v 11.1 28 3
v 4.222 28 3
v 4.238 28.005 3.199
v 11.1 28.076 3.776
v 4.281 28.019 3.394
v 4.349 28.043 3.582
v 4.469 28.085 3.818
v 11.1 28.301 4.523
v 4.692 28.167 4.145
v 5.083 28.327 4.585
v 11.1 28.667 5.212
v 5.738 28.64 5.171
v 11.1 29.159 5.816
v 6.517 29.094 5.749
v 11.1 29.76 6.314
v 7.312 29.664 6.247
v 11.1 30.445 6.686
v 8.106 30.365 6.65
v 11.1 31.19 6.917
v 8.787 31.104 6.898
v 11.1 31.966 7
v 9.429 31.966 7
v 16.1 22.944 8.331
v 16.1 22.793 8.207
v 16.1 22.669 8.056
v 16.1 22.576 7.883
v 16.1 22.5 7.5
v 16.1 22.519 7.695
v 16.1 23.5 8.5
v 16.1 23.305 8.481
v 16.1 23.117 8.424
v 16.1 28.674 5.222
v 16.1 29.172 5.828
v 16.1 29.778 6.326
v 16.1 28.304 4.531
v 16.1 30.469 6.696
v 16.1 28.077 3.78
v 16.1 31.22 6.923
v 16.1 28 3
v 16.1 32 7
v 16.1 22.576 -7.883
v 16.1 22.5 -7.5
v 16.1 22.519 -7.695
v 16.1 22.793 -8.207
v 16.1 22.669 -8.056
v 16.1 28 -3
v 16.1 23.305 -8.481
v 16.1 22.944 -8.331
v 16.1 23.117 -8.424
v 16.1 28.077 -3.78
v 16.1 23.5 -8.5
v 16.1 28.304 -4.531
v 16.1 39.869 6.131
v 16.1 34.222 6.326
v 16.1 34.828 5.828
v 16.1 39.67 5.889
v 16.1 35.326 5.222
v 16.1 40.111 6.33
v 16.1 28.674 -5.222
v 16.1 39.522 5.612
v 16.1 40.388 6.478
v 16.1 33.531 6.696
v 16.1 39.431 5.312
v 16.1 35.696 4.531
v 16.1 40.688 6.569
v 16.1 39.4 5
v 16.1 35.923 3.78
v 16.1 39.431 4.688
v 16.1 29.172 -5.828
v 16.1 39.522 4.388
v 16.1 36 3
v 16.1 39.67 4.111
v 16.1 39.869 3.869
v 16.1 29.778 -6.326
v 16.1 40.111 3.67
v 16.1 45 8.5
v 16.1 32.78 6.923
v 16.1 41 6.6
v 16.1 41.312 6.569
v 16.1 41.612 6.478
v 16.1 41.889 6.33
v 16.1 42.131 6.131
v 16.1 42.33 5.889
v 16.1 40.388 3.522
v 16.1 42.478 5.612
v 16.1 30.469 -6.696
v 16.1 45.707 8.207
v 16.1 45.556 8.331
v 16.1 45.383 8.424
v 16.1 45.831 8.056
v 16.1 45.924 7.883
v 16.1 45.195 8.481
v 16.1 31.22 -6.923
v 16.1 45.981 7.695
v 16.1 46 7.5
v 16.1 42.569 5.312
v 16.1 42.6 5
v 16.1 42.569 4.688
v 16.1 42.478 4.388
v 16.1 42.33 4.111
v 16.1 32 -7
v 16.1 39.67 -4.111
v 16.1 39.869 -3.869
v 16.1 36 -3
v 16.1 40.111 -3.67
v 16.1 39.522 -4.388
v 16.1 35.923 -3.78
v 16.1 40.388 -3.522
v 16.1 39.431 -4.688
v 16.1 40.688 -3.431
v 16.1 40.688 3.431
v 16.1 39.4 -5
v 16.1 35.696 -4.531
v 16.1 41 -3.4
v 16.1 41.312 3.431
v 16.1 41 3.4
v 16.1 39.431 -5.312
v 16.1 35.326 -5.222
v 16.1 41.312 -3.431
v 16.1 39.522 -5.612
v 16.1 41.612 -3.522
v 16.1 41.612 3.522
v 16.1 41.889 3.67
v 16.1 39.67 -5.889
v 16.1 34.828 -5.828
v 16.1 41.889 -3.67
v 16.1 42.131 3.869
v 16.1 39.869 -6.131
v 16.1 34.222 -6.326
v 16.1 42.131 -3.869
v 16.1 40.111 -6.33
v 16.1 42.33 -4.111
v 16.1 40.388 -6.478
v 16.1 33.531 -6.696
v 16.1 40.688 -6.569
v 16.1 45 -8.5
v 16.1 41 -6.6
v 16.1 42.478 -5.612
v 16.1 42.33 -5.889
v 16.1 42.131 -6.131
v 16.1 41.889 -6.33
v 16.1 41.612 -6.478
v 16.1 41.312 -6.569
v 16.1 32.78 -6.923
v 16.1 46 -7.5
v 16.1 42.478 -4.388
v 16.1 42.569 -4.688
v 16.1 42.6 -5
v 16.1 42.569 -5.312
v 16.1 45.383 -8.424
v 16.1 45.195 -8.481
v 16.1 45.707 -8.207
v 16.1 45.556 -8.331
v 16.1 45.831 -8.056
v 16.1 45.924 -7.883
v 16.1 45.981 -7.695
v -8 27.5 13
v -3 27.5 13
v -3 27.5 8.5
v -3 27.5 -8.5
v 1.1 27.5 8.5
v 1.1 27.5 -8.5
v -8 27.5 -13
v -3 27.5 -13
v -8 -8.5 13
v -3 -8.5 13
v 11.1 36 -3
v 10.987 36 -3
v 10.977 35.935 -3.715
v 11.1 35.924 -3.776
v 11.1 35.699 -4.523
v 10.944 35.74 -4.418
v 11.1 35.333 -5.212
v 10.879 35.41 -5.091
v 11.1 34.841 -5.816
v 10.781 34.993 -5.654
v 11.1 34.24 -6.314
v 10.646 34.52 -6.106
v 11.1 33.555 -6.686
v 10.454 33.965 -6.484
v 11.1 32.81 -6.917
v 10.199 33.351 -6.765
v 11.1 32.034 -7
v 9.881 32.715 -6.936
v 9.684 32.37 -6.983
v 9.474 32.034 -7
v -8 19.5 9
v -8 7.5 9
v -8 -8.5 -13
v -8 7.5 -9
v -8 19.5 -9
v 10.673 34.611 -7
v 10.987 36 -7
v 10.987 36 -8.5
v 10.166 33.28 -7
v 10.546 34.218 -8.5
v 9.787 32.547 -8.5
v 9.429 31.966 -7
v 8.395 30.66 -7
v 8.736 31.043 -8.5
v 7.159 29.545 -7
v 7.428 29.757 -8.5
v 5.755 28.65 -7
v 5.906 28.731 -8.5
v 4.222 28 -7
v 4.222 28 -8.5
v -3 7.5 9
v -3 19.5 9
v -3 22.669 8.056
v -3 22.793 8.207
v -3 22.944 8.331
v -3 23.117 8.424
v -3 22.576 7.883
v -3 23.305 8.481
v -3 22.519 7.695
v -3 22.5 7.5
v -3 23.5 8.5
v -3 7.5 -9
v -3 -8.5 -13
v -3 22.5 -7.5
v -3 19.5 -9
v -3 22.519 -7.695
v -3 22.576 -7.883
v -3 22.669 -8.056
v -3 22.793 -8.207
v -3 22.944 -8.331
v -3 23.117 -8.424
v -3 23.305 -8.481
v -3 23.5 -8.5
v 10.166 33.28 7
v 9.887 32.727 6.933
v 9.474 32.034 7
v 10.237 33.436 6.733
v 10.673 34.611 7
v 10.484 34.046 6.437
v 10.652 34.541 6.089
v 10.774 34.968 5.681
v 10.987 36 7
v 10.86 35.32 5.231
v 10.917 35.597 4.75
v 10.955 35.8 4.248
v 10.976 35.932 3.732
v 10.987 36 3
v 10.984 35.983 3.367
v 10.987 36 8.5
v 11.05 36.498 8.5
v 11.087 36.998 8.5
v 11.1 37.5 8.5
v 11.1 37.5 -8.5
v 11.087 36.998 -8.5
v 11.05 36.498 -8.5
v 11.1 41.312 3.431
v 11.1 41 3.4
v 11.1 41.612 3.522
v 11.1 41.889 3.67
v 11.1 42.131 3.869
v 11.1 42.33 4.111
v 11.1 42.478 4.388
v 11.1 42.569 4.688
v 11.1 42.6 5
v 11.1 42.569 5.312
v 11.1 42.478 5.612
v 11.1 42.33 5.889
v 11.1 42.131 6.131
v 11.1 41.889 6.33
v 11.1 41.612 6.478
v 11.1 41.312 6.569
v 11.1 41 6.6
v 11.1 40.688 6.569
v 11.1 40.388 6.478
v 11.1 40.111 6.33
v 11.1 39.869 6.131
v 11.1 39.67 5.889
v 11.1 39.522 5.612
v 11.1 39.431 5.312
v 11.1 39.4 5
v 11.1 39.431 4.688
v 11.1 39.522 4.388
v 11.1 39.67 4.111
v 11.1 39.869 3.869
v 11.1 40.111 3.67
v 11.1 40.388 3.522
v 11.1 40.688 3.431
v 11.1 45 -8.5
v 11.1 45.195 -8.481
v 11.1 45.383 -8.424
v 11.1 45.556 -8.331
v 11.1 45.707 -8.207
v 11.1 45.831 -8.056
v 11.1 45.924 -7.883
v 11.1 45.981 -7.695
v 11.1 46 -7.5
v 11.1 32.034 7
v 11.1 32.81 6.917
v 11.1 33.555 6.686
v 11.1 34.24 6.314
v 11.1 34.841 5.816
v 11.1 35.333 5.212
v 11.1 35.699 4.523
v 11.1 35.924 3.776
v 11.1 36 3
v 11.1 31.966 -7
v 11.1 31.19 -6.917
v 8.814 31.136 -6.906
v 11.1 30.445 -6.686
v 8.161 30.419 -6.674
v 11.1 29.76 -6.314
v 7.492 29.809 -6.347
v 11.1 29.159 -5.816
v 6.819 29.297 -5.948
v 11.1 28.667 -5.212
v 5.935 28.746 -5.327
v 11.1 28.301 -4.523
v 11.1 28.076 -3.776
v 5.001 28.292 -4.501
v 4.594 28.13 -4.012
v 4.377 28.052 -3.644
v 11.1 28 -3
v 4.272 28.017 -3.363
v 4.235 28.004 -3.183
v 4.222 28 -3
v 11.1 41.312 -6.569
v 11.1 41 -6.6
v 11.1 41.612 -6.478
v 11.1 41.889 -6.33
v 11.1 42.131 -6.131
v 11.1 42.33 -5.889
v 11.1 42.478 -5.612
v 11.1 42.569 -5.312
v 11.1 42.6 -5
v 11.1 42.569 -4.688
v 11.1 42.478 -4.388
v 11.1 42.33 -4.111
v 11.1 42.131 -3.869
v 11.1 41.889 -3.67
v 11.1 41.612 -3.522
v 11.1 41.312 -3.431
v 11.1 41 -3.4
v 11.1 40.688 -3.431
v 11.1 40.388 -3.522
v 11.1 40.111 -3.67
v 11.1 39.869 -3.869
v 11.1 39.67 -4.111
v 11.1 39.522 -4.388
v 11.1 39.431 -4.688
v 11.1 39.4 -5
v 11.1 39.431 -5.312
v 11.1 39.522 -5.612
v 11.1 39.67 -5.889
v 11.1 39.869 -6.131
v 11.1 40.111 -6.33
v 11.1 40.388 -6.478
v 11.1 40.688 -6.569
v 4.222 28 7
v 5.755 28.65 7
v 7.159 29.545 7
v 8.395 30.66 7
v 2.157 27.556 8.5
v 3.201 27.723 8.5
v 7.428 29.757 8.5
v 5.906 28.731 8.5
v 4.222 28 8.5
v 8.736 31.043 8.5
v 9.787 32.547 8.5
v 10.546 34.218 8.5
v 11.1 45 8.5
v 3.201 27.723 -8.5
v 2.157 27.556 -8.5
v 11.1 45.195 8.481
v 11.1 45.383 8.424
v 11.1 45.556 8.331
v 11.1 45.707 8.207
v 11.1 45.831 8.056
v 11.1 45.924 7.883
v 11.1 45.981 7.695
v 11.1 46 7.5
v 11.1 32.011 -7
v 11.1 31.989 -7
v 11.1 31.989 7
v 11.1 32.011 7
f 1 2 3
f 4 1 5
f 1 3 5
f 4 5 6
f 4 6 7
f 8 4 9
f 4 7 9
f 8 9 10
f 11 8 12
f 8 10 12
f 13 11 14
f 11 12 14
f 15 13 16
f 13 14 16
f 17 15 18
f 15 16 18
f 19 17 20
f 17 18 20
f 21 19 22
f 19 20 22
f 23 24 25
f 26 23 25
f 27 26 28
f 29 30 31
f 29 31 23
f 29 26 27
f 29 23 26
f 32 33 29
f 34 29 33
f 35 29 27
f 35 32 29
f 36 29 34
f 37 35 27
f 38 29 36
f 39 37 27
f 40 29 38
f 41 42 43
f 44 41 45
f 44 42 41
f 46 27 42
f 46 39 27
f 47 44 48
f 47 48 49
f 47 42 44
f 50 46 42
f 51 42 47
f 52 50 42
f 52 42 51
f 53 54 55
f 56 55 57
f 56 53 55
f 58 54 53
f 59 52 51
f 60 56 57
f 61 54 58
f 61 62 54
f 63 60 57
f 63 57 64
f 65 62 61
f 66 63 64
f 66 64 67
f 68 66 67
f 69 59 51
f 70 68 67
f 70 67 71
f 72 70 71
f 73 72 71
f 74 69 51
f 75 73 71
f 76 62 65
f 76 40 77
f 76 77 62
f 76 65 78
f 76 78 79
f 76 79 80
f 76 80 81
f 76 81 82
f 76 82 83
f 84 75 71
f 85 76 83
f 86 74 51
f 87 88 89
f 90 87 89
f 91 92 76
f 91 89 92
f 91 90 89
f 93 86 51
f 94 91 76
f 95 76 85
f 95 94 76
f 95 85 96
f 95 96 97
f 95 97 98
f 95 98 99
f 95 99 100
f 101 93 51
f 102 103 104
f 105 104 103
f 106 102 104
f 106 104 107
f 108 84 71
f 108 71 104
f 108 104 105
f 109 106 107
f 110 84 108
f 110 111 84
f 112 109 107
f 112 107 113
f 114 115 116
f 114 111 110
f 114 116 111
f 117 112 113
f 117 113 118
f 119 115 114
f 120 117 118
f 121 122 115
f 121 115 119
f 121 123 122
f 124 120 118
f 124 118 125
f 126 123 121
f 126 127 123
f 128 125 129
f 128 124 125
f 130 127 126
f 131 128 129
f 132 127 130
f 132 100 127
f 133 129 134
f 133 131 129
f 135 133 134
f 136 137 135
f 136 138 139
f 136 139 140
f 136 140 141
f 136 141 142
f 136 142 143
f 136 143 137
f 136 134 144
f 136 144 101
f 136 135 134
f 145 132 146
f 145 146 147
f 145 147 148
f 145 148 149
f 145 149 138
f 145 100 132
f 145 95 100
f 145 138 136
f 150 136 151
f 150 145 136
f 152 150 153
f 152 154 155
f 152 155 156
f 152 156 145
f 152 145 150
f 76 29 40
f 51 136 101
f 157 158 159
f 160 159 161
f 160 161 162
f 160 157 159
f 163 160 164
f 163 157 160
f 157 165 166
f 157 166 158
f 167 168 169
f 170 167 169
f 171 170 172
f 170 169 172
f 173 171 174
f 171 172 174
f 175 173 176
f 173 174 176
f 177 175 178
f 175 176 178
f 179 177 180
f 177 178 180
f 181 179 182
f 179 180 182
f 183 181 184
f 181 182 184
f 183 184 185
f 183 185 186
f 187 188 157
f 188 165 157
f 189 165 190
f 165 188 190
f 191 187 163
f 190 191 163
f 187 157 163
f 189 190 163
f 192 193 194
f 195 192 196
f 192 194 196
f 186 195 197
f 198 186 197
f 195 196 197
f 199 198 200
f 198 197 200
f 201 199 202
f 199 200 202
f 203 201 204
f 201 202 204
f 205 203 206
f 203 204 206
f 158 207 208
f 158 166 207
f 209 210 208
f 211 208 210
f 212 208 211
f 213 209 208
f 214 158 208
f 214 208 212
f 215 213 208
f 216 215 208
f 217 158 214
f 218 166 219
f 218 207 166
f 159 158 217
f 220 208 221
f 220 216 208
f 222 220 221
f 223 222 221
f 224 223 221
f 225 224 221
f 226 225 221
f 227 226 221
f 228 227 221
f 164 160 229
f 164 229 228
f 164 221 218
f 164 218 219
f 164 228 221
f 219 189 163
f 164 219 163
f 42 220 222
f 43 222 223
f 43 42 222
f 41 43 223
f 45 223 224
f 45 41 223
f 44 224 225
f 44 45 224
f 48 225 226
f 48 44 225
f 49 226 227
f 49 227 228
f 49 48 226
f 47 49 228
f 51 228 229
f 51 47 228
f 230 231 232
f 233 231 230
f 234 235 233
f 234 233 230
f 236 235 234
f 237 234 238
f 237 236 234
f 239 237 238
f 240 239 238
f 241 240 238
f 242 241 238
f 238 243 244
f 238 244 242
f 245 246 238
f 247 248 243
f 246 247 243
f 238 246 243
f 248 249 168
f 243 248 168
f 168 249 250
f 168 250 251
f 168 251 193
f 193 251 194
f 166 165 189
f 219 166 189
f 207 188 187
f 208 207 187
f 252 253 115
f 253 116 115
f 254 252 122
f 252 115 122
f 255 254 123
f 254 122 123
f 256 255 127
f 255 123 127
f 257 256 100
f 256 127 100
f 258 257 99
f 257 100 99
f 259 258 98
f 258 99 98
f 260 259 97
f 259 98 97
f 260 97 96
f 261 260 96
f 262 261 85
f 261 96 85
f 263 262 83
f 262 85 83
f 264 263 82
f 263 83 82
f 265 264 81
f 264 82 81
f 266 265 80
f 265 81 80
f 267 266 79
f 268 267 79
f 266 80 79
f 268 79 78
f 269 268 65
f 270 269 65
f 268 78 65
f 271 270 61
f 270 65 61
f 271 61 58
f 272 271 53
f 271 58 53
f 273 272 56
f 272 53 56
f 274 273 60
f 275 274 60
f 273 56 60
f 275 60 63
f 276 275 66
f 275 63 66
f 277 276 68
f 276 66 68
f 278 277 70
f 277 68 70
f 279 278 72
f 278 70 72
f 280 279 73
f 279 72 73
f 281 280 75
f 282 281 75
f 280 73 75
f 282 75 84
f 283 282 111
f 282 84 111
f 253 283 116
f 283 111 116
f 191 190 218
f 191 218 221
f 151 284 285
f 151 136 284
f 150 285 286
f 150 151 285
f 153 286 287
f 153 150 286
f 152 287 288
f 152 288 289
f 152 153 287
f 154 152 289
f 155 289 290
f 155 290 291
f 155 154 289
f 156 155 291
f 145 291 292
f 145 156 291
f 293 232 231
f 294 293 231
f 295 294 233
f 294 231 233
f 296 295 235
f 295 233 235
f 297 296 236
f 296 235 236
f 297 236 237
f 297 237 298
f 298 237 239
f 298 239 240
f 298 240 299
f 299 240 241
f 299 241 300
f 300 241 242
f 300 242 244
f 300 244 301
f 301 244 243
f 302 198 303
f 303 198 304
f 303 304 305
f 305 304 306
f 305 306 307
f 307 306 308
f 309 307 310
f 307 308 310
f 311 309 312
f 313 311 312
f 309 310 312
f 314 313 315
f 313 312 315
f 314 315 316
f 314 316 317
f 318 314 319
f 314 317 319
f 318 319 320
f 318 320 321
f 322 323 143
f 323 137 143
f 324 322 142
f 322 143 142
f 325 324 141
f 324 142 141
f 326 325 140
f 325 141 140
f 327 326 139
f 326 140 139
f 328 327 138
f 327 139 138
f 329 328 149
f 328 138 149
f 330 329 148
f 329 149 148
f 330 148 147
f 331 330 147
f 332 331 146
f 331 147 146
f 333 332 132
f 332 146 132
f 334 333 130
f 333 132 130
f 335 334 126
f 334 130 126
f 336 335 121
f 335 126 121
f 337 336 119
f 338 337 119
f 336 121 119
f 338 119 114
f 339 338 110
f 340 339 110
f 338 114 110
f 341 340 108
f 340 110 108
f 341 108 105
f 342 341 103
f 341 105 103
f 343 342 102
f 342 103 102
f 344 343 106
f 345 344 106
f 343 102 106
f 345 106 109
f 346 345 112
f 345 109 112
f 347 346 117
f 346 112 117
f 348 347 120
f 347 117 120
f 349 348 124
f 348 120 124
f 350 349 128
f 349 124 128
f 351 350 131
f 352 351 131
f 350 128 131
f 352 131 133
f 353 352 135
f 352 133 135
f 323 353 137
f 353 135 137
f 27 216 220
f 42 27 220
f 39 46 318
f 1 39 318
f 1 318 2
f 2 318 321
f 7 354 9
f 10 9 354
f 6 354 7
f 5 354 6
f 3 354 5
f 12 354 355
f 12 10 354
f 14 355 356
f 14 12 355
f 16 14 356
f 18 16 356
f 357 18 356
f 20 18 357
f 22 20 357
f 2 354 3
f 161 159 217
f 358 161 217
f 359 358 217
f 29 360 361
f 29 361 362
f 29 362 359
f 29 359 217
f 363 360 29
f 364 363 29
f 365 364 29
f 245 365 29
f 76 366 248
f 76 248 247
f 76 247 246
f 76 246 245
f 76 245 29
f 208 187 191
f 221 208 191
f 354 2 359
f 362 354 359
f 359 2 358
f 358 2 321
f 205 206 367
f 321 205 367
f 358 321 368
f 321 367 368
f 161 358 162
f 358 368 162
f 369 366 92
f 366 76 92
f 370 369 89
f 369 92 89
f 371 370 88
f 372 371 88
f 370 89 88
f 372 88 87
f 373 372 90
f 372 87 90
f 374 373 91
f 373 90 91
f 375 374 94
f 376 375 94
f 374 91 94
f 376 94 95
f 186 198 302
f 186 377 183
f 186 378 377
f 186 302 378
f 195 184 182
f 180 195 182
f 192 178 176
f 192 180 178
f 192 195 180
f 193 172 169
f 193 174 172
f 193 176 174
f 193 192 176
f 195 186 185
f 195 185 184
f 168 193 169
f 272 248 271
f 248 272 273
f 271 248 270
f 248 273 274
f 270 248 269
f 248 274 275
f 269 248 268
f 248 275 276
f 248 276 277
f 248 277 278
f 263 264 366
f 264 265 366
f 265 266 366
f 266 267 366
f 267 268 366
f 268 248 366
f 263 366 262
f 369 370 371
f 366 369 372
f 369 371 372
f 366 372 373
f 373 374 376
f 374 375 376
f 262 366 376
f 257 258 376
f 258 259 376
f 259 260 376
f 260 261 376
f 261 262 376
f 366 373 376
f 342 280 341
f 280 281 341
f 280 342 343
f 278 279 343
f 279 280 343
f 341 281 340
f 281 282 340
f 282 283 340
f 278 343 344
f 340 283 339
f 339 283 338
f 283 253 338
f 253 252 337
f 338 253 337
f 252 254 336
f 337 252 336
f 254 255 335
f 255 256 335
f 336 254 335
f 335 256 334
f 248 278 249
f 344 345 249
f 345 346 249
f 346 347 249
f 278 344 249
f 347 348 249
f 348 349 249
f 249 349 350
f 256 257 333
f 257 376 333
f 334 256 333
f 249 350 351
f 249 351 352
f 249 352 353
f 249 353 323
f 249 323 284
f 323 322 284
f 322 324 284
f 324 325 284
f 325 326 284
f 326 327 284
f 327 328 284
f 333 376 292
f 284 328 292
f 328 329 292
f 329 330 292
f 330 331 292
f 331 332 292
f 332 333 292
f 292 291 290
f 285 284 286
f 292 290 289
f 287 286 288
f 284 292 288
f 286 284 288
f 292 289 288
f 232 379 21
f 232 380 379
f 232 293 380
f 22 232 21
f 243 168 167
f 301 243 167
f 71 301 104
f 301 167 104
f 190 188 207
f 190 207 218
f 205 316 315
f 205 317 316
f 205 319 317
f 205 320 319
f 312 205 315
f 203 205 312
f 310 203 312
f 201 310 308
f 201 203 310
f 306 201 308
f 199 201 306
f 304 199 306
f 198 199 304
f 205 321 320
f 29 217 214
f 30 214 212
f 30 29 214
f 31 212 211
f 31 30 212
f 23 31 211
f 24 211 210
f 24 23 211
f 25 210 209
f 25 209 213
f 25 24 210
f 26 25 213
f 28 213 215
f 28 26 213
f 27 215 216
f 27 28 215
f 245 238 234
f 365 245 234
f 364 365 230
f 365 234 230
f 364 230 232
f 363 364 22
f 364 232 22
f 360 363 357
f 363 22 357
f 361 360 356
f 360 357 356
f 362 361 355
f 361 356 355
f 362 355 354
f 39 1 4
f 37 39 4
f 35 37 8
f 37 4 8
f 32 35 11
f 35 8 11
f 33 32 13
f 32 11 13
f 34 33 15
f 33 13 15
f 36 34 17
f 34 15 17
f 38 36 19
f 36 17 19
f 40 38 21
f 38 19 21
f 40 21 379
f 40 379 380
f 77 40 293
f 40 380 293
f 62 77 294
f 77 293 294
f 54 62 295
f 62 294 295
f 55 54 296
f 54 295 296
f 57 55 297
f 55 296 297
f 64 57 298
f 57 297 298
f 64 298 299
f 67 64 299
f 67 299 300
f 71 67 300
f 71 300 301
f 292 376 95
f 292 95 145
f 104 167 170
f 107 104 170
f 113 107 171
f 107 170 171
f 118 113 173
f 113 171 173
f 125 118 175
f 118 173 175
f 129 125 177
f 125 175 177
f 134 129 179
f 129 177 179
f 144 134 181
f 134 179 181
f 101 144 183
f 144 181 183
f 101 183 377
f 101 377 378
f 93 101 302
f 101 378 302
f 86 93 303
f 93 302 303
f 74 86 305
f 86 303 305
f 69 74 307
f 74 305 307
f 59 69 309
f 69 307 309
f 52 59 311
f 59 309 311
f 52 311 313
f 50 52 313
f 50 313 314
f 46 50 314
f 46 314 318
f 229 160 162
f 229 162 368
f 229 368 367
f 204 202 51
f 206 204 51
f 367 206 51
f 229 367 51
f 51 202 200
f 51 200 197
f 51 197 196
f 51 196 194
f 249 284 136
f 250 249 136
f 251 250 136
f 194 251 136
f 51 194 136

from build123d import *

# Parameters (mm, degrees)
BOSS_EXTRUDE1_START      = -8
SKETCH2_W                = 26
SKETCH2_H                = 36
SKETCH2_W_2              = 18
SKETCH2_H_2              = 12
BOSS_EXTRUDE1_DEPTH      = 5
BOSS_EXTRUDE2_START      = -3
SKETCH2_7_W              = 17
SKETCH2_7_H              = 5
BOSS_EXTRUDE2_DEPTH      = 19.1
BOSS_EXTRUDE3_START      = 11.1
SKETCH2_14_W             = 17
SKETCH2_14_H             = 18.5
BOSS_EXTRUDE3_DEPTH      = 5
M3_CLEARANCE_HOLE1_D     = 3.2
M3_CLEARANCE_HOLE1_DEPTH = 5
M3_CLEARANCE_HOLE1_TIP   = 0.96137699
FILLET1_START            = -8.5
FILLET1_DEPTH            = 17
FILLET1_2_DEPTH          = 1.500148193
FILLET1_START_2          = 6.999851807
FILLET1_3_DEPTH          = 1.500148193
FILLET1_START_3          = 5.377704746
FILLET1_4_DEPTH          = 5.722295254
FILLET1_START_4          = 5.601514307
FILLET1_5_DEPTH          = 5.498485693
FILLET1_START_5          = 4.22249738
FILLET1_6_DEPTH          = 5.871975237
FILLET1_START_6          = -6.999851807
FILLET1_7_DEPTH          = 13.999703614
FILLET3_R                = 1


with BuildPart() as part:
    # Sketch2 → Boss-Extrude1 (new body)
    with BuildSketch(Plane(origin=(0, 0, 0), x_dir=(0, 0, -1), z_dir=(1, 0, 0)).offset(BOSS_EXTRUDE1_START)):
        with Locations((0, 9.5)):
            Rectangle(SKETCH2_W, SKETCH2_H)
        with Locations((0, 13.5)):
            Rectangle(SKETCH2_W_2, SKETCH2_H_2, mode=Mode.SUBTRACT)
    extrude(amount=BOSS_EXTRUDE1_DEPTH)

    # Sketch2<7> → Boss-Extrude2 (add)
    with BuildSketch(Plane(origin=(0, 0, 0), x_dir=(0, 0, -1), z_dir=(1, 0, 0)).offset(BOSS_EXTRUDE2_START)):
        with Locations((0, 25)):
            Rectangle(SKETCH2_7_W, SKETCH2_7_H)
    extrude(amount=BOSS_EXTRUDE2_DEPTH)

    # Sketch2<14> → Boss-Extrude3 (add)
    with BuildSketch(Plane(origin=(0, 0, 0), x_dir=(0, 0, -1), z_dir=(1, 0, 0)).offset(BOSS_EXTRUDE3_START)):
        with Locations((0, 36.75)):
            Rectangle(SKETCH2_14_W, SKETCH2_14_H)
        with BuildLine():
            Line((3, 28), (-3, 28))
            ThreePointArc((-3, 28), (-7, 32), (-3, 36))
            Line((-3, 36), (3, 36))
            ThreePointArc((3, 36), (7, 32), (3, 28))
        make_face(mode=Mode.SUBTRACT)
    extrude(amount=BOSS_EXTRUDE3_DEPTH)

    # M3 Clearance Hole1
    with Locations(Plane.ZY.offset(-11.1)):
        with Locations((5, 41), (-5, 41)):
            Hole(M3_CLEARANCE_HOLE1_D / 2, depth=M3_CLEARANCE_HOLE1_DEPTH)
            with Locations((0, 0, -(M3_CLEARANCE_HOLE1_DEPTH + M3_CLEARANCE_HOLE1_TIP / 2))):  # 118° drill point
                Cone(0, M3_CLEARANCE_HOLE1_D / 2, M3_CLEARANCE_HOLE1_TIP, mode=Mode.SUBTRACT)

    # Fillet1: read off the stored shape, not the designer's step
    # Fillet1 outline → Fillet1 (add)
    with BuildSketch(Plane.XY.offset(FILLET1_START)):
        with BuildLine():
            Line((11.1, 28), (4.222498999, 28))
            ThreePointArc((4.222498999, 28), (2.68113883, 27.625791171), (1.1, 27.5))
            Line((1.1, 27.5), (11.1, 27.5))
            Line((11.1, 27.5), (11.1, 28))
        make_face()
        with BuildLine():
            ThreePointArc((11.1, 37.5), (11.071674876, 36.747869581), (10.986859967, 36))
            Line((10.986859967, 36), (11.1, 36))
            Line((11.1, 36), (11.1, 37.5))
        make_face()
    extrude(amount=FILLET1_DEPTH)

    # Fillet1 2 outline → Fillet1 2 (add)
    with BuildSketch(Plane.XY.offset(FILLET1_START)):
        with BuildLine():
            ThreePointArc((10.986859967, 36), (8.736154476, 31.04328684), (4.222498999, 28))
            Line((4.222498999, 28), (11.1, 28))
            Line((11.1, 28), (11.1, 36))
            Line((11.1, 36), (10.986859967, 36))
        make_face()
    extrude(amount=FILLET1_2_DEPTH)

    # Fillet1 3 outline → Fillet1 3 (add)
    with BuildSketch(Plane.XY.offset(FILLET1_START_2)):
        with BuildLine():
            ThreePointArc((10.986859967, 36), (8.736154476, 31.04328684), (4.222498999, 28))
            Line((4.222498999, 28), (11.1, 28))
            Line((11.1, 28), (11.1, 36))
            Line((11.1, 36), (10.986859967, 36))
        make_face()
    extrude(amount=FILLET1_3_DEPTH)

    # Fillet1 4 outline → Fillet1 4 (cut)
    with BuildSketch(Plane.YZ.offset(FILLET1_START_3)):
        with BuildLine():
            Line((31.965568589, 6.999851807), (32.034431411, 6.999851807))
            ThreePointArc((32.034431411, 6.999851807), (32, 7), (31.965568589, 6.999851807))
        make_face()
        with BuildLine():
            ThreePointArc((31.965568589, -6.999851807), (32, -7), (32.034431411, -6.999851807))
            Line((32.034431411, -6.999851807), (31.965568589, -6.999851807))
        make_face()
    extrude(amount=FILLET1_4_DEPTH, mode=Mode.SUBTRACT)

    # Fillet1 5 outline → Fillet1 5 (add)
    with BuildSketch(Plane.YZ.offset(FILLET1_START_4)):
        with BuildLine():
            ThreePointArc((32.034431411, 6.999851807), (34.840574382, 5.816227473), (36, 3))
            Line((36, 3), (36, 6.999851807))
            Line((36, 6.999851807), (32.034431411, 6.999851807))
        make_face()
        with BuildLine():
            Line((36, -6.999851807), (36, -3))
            ThreePointArc((36, -3), (34.840574382, -5.816227473), (32.034431411, -6.999851807))
            Line((32.034431411, -6.999851807), (36, -6.999851807))
        make_face()
        with BuildLine():
            ThreePointArc((28, 3), (29.159425618, 5.816227473), (31.965568589, 6.999851807))
            Line((31.965568589, 6.999851807), (28, 6.999851807))
            Line((28, 6.999851807), (28, 3))
        make_face()
        with BuildLine():
            Line((28, -6.999851807), (31.965568589, -6.999851807))
            ThreePointArc((31.965568589, -6.999851807), (29.159425618, -5.816227473), (28, -3))
            Line((28, -3), (28, -6.999851807))
        make_face()
    extrude(amount=FILLET1_5_DEPTH)

    # Fillet1 6 outline → Fillet1 6 (add)
    with BuildSketch(Plane.YZ.offset(FILLET1_START_5)):
        with BuildLine():
            ThreePointArc((28, 3), (29.159425618, 5.816227473), (31.965568589, 6.999851807))
            Line((31.965568589, 6.999851807), (28, 6.999851807))
            Line((28, 6.999851807), (28, 3))
        make_face()
        with BuildLine():
            Line((28, -6.999851807), (31.965568589, -6.999851807))
            ThreePointArc((31.965568589, -6.999851807), (29.159425618, -5.816227473), (28, -3))
            Line((28, -3), (28, -6.999851807))
        make_face()
    extrude(amount=FILLET1_6_DEPTH)

    # Fillet1 7 outline → Fillet1 7 (cut)
    with BuildSketch(Plane.XY.offset(FILLET1_START_6)):
        with BuildLine():
            ThreePointArc((4.222497538, 27.99999952), (8.736153979, 31.043286253), (10.986859967, 36))
            ThreePointArc((10.986859967, 36), (11.049747147, 36.498734945), (11.087492178, 37))
            Line((11.087492178, 37), (3, 37))
            Line((3, 37), (3, 27.682159097))
            ThreePointArc((3, 27.682159097), (3.616272245, 27.821757701), (4.222497538, 27.99999952))
        make_face()
    extrude(amount=FILLET1_7_DEPTH, mode=Mode.SUBTRACT)

    # Fillet3
    fillet3_edges = [part.edges().sort_by_distance(p)[0] for p in [
        (6.55, 22.5, -8.5),
        (6.55, 22.5, 8.5),
        (13.6, 46, -8.5),
        (13.6, 46, 8.5),
    ]]
    fillet(fillet3_edges, radius=FILLET3_R)


solid = part.part
